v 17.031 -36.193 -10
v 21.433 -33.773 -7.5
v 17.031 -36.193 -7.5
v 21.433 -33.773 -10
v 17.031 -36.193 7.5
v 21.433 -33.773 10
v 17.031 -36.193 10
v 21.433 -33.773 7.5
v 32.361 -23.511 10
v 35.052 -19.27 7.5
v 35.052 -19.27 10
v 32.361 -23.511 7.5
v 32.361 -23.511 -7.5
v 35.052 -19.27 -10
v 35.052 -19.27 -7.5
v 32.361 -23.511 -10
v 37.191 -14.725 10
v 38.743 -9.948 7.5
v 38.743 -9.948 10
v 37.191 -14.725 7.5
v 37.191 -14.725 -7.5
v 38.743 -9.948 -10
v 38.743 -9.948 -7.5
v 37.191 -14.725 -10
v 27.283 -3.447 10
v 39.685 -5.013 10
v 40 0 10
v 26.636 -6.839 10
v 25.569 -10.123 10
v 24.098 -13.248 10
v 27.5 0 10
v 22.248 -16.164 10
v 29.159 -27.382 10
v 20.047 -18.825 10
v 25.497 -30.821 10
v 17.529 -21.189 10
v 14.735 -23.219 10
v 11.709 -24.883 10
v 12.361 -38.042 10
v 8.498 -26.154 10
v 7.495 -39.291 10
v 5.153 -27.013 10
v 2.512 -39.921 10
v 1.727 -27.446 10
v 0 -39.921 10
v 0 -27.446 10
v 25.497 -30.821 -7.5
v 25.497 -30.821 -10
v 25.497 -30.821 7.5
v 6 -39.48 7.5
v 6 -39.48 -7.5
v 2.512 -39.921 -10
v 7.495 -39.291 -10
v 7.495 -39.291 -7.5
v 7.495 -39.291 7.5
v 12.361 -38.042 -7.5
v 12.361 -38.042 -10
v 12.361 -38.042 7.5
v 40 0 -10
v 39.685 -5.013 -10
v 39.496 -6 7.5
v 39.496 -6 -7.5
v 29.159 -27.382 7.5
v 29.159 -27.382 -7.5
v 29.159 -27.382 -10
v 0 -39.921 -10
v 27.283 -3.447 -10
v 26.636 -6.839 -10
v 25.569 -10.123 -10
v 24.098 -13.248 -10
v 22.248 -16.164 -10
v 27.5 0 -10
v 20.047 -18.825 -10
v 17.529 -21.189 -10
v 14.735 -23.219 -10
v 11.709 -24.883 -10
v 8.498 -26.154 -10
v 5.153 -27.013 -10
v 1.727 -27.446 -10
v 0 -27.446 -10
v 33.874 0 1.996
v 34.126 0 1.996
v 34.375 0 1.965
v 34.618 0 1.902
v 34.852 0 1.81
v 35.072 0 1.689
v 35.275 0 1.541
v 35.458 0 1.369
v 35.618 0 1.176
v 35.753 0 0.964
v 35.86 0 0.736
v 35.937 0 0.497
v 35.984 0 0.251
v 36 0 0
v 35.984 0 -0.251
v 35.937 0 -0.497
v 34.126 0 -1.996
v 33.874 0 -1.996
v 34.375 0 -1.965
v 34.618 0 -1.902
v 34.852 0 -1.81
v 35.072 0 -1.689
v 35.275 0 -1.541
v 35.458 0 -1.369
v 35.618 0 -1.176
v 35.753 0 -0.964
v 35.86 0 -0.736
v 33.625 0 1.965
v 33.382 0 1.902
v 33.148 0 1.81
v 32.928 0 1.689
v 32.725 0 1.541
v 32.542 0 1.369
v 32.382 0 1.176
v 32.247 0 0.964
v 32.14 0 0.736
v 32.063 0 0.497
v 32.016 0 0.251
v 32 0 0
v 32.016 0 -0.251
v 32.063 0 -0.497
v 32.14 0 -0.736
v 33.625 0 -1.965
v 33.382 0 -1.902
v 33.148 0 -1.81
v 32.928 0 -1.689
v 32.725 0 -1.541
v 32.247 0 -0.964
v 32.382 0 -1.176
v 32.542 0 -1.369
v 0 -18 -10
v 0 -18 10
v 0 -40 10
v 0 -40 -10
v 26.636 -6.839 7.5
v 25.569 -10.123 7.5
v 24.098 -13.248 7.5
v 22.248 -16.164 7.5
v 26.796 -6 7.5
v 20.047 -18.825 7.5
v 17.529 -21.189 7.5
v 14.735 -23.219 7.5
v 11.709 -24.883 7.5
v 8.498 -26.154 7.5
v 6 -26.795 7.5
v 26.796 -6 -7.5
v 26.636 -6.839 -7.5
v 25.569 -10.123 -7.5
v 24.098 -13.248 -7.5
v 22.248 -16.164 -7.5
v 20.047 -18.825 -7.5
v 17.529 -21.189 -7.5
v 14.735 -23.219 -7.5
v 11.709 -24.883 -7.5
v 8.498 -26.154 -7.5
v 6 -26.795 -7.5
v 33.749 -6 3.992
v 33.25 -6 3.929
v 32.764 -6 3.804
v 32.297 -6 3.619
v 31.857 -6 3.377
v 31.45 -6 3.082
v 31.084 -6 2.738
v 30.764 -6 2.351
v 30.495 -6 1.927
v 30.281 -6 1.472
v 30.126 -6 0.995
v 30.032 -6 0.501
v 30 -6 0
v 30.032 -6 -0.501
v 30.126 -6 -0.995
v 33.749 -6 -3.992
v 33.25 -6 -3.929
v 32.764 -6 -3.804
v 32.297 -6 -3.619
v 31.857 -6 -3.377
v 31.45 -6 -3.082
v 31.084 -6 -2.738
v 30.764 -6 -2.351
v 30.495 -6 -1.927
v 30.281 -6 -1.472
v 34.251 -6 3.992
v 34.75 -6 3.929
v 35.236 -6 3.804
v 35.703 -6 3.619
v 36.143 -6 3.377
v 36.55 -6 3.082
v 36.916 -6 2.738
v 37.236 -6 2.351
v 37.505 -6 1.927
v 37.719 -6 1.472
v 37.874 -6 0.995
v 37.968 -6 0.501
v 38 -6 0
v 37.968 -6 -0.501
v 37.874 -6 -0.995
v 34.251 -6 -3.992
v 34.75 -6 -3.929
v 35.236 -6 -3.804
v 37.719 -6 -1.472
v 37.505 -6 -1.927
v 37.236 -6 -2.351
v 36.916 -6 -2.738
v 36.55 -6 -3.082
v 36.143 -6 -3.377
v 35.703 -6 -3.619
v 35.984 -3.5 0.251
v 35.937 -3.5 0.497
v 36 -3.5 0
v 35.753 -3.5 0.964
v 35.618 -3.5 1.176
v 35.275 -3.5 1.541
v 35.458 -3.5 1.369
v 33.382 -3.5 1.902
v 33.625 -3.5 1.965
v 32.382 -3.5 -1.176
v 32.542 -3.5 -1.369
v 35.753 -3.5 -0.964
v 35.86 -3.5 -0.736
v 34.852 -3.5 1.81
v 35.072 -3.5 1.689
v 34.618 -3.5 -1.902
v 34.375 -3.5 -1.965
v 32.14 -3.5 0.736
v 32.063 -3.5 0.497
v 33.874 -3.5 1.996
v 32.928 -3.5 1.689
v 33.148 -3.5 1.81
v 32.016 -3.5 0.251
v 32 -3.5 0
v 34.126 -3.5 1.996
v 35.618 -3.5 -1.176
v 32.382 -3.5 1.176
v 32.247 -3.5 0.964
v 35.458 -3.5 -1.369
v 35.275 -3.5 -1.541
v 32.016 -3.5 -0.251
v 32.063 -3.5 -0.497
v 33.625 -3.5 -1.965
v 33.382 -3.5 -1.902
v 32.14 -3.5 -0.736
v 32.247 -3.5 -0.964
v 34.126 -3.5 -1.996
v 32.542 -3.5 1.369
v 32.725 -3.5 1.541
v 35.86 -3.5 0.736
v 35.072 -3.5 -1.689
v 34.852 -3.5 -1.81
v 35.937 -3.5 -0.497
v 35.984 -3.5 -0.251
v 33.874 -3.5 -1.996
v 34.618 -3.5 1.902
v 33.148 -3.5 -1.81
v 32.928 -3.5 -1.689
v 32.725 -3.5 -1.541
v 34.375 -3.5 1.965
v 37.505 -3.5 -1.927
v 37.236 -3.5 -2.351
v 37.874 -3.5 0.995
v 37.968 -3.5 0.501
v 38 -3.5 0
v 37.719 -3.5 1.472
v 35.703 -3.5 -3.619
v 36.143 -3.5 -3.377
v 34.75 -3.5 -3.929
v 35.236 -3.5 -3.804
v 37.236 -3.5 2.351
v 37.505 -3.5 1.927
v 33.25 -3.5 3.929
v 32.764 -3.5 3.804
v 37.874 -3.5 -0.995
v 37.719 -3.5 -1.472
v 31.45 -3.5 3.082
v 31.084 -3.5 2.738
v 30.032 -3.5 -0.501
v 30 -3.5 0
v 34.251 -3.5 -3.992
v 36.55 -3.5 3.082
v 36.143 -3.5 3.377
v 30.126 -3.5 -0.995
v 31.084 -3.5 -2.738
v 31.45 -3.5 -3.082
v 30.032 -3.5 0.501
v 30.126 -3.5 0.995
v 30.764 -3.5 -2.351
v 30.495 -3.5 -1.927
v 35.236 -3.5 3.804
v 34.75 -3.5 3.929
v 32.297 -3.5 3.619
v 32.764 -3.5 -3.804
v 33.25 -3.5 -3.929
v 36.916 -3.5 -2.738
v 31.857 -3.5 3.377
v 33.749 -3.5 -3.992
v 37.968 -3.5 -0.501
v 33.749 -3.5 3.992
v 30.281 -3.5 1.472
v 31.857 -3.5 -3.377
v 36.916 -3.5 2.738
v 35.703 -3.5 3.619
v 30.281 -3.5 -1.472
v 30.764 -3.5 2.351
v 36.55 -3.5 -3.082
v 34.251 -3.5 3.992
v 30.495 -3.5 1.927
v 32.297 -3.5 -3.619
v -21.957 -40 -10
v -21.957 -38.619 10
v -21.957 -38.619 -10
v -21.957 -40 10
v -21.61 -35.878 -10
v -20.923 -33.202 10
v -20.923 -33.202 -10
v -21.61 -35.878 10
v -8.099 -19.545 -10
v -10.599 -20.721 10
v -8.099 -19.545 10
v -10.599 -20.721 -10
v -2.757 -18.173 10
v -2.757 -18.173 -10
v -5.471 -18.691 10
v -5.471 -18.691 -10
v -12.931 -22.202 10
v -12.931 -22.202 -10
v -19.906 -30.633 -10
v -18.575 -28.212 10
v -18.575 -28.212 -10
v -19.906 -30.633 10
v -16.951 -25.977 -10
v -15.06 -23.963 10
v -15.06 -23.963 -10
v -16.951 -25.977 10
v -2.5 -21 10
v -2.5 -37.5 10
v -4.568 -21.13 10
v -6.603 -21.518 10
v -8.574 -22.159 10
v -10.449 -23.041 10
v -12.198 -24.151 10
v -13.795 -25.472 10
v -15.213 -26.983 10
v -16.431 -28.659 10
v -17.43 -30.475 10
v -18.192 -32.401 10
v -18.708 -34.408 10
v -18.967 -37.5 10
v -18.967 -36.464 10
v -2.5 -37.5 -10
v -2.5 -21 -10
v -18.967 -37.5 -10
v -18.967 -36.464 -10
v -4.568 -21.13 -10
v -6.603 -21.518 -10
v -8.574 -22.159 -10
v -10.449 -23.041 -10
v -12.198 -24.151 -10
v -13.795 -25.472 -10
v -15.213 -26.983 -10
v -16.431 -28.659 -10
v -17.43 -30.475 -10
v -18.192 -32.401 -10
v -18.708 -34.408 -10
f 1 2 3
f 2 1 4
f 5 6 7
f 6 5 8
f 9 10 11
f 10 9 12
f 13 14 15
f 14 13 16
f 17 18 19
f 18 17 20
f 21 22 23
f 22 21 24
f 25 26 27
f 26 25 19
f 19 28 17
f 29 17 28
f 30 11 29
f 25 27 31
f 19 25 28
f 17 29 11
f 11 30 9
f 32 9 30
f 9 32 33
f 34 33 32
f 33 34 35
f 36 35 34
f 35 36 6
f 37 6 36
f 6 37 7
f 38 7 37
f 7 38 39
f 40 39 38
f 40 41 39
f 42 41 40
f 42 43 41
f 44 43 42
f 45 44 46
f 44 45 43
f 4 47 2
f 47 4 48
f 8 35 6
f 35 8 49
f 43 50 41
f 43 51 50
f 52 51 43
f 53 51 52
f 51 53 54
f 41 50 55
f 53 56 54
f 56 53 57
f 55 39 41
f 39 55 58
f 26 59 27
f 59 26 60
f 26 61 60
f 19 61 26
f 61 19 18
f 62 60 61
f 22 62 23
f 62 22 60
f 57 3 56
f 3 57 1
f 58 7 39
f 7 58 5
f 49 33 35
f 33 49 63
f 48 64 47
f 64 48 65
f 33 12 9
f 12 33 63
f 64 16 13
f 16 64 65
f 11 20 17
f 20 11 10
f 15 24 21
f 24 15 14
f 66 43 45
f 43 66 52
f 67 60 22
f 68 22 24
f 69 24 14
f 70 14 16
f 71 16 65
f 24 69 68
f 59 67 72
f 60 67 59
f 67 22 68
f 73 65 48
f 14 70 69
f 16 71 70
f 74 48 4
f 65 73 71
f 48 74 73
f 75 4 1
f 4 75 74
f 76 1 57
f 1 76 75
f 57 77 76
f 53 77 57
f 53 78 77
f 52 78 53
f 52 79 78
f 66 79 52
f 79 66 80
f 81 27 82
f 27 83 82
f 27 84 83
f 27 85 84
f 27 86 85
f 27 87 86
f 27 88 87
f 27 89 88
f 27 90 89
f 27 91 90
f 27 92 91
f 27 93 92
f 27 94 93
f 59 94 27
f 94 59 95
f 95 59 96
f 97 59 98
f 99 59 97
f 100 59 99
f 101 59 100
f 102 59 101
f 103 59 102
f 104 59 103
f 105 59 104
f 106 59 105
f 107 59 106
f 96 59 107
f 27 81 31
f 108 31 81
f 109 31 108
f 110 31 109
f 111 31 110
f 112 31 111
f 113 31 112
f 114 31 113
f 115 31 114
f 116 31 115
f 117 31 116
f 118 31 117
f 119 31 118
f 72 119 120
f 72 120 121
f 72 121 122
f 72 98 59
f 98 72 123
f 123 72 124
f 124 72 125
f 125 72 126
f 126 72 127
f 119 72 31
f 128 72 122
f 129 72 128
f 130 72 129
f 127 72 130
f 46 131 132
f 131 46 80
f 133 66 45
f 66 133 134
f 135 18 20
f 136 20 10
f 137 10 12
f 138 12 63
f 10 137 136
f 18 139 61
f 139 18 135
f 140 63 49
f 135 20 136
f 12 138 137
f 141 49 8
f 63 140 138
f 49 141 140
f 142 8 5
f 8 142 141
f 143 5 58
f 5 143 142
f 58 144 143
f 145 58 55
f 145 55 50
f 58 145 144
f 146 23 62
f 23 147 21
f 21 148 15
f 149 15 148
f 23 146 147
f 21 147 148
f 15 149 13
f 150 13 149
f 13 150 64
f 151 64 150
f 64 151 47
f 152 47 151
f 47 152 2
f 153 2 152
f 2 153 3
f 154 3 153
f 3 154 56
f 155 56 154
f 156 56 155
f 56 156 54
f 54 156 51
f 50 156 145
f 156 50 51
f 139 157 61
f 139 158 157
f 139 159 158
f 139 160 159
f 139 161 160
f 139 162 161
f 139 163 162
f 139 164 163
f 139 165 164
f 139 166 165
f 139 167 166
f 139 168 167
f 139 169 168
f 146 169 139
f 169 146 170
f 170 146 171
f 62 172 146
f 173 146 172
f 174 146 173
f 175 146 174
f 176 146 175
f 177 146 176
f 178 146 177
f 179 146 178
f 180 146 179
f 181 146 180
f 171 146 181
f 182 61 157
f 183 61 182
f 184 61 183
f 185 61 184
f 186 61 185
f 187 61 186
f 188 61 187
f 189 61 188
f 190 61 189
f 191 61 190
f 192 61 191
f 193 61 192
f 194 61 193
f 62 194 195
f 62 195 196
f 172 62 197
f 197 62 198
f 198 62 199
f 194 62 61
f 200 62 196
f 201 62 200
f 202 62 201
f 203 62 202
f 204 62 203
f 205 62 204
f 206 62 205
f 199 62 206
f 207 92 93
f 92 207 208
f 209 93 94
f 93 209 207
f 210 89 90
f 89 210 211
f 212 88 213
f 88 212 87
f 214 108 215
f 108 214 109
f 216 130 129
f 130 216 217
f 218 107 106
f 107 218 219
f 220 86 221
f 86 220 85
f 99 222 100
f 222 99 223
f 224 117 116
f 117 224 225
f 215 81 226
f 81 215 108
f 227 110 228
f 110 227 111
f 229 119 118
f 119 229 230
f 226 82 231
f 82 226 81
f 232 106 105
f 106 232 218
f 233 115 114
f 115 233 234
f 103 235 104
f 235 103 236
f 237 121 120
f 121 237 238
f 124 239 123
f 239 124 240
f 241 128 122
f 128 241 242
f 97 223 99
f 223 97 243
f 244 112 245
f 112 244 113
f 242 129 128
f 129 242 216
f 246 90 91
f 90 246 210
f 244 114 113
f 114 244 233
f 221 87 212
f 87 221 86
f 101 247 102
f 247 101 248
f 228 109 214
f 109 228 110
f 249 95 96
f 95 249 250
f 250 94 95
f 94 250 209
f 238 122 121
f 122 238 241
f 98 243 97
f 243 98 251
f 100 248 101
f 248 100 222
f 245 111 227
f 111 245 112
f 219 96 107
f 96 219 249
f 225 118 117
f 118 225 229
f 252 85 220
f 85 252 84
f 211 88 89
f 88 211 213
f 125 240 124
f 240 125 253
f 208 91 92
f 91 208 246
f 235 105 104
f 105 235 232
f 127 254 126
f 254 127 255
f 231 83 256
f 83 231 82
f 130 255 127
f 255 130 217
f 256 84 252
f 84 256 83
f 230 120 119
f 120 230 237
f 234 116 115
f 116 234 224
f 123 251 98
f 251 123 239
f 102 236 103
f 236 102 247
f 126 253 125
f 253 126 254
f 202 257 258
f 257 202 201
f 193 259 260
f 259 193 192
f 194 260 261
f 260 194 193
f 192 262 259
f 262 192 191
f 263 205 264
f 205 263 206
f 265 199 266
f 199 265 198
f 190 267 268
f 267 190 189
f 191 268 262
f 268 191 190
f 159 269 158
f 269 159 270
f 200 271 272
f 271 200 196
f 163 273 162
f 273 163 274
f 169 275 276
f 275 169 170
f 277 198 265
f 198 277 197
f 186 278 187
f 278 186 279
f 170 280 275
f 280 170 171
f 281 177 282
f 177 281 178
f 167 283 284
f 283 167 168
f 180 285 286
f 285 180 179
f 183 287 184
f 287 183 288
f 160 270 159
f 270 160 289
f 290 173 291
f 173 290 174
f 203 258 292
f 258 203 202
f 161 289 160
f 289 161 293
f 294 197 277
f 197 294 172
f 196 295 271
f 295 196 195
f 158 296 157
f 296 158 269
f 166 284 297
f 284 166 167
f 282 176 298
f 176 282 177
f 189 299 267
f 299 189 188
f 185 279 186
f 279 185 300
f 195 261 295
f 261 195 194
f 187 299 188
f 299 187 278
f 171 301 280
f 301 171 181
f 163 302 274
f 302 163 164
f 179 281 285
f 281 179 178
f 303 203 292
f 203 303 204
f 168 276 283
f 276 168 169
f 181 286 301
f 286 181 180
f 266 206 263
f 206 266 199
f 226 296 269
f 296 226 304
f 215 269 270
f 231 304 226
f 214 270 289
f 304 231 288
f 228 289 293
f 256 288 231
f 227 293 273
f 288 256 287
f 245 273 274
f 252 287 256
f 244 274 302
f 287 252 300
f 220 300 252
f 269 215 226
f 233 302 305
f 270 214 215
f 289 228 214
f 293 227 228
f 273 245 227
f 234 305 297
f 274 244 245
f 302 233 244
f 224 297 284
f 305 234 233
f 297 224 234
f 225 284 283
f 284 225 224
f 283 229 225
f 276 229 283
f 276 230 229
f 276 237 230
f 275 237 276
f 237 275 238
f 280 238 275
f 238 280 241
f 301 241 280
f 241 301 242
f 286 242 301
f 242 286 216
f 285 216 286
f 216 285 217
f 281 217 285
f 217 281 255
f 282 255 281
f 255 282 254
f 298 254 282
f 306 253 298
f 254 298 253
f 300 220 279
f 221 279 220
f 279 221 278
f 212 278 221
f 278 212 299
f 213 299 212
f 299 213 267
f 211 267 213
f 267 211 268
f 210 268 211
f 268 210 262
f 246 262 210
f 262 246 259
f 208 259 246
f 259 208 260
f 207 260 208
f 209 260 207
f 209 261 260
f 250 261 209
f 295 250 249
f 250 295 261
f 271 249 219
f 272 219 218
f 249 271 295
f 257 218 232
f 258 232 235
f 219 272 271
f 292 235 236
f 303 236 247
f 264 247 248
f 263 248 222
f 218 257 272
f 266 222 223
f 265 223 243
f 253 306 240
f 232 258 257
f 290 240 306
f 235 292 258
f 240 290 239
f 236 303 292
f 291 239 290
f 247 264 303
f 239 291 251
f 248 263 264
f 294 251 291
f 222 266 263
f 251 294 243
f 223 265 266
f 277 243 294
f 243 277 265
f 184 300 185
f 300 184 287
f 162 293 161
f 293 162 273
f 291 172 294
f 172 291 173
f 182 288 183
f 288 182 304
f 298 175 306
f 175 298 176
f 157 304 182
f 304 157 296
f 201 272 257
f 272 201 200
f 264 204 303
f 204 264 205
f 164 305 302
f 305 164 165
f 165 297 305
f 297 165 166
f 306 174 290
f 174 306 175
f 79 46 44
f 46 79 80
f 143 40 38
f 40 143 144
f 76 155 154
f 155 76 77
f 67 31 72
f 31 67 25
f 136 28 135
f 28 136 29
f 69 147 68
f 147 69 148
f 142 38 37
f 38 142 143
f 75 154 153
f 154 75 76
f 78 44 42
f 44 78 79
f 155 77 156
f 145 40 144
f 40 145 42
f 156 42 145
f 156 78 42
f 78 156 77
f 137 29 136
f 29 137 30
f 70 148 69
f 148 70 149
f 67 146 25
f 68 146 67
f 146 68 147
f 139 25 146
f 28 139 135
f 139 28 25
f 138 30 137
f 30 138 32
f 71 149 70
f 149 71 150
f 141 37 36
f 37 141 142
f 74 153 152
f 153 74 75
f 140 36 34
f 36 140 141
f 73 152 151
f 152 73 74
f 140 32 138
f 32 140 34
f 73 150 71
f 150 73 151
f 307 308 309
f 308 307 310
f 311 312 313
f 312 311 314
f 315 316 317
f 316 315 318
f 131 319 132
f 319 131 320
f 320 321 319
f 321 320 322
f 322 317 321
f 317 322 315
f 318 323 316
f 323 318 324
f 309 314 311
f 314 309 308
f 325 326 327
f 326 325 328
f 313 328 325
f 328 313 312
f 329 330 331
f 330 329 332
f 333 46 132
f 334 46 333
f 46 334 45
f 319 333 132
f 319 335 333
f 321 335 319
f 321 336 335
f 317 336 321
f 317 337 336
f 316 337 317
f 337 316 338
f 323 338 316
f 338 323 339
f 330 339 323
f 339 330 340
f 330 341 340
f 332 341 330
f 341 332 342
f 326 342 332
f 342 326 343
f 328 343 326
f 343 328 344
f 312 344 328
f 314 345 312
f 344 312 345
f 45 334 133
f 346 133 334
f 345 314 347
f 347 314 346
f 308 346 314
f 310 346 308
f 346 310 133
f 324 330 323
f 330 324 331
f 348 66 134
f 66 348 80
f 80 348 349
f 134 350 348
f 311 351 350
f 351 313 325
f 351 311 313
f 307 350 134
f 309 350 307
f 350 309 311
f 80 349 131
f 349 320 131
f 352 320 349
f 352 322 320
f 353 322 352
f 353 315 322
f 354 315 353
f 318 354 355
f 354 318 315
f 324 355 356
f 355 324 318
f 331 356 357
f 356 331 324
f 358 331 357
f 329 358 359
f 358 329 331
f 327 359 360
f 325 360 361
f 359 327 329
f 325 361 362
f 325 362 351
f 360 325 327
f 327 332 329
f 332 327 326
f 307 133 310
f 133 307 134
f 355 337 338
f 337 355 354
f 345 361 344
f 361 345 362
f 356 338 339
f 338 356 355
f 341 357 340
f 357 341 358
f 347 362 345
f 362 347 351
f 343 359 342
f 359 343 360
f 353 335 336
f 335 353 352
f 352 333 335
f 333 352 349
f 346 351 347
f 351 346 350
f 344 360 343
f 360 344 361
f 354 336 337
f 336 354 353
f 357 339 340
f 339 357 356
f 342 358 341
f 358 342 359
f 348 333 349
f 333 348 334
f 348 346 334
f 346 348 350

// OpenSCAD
// LED Halterung

$fn=50;

gebogen = true;
gerade= false;
Halter=true;

Radius = 40;
Width = 20;
InnerWidth = 15;

wLED = 16.5;

module Loch() {
    union() {
        cylinder(d=4, h=20, center=true);
        translate([0,0,6])cylinder(d=8, h=5, center=true);
    }
}

module Viertelkreis(R,W) {
    difference() {
        cylinder(d=R*2,h=W,center=true);
        translate([-R,0,-W/2-3]) cube([R*2+3,R+3,W+5]);
        translate([-R-3,-R-2,-W/2-2]) cube([R+3,R+3,W+5]);
        
    }
    
//    intersection() {
//        cylinder(d=R*2,h=W,center=true);
//        translate([0,-Radius,-Width/2])cube([R,R,W+2]);        
//    }
    
}

module hohlerViertelkreis(R,W,IW) {
    difference() {
        Viertelkreis(R,W);
        translate([R/2+6,-R/2-6,0]) cube([R,R,IW],center=true);        
    }
}

module Halter() {
  
  rotate([0,-180,-90])
  translate([0,0,0])
  difference() {
    Viertelkreis(22,Width); 
    translate([2.5,-2.5,0]) Viertelkreis(wLED,Width+3);
  } 

}

module LEDHalterung() {
    difference() {
        hohlerViertelkreis(Radius, Width, InnerWidth);
        translate([0,0,0])cylinder(d=Radius*2-25,h=50,center=true);
        rotate([90,0,0])
        translate([Radius-6,0,0])
        Loch();
    }
}

module LEDHalterGerade() {
    translate([Radius/2,-Width/2,0])
    difference(){
        cube([Radius,Width,Width],center=true);
        translate([0,-2.5,0]) cube([Radius-5,Width,InnerWidth],center=true);
        rotate([-90,0,0])
        translate([Radius/2-10,0,0.5])
        Loch();
        rotate([-90,0,0])
        translate([Radius/2-50,0,0.5])
        Loch();
    }
    translate([Width/4,-Radius/2,0]) cube([Width/2,Radius,Width],center=true);
}



if (gebogen) LEDHalterung();
if (gerade) LEDHalterGerade();
if (Halter) translate([0,-Radius,0])Halter();
